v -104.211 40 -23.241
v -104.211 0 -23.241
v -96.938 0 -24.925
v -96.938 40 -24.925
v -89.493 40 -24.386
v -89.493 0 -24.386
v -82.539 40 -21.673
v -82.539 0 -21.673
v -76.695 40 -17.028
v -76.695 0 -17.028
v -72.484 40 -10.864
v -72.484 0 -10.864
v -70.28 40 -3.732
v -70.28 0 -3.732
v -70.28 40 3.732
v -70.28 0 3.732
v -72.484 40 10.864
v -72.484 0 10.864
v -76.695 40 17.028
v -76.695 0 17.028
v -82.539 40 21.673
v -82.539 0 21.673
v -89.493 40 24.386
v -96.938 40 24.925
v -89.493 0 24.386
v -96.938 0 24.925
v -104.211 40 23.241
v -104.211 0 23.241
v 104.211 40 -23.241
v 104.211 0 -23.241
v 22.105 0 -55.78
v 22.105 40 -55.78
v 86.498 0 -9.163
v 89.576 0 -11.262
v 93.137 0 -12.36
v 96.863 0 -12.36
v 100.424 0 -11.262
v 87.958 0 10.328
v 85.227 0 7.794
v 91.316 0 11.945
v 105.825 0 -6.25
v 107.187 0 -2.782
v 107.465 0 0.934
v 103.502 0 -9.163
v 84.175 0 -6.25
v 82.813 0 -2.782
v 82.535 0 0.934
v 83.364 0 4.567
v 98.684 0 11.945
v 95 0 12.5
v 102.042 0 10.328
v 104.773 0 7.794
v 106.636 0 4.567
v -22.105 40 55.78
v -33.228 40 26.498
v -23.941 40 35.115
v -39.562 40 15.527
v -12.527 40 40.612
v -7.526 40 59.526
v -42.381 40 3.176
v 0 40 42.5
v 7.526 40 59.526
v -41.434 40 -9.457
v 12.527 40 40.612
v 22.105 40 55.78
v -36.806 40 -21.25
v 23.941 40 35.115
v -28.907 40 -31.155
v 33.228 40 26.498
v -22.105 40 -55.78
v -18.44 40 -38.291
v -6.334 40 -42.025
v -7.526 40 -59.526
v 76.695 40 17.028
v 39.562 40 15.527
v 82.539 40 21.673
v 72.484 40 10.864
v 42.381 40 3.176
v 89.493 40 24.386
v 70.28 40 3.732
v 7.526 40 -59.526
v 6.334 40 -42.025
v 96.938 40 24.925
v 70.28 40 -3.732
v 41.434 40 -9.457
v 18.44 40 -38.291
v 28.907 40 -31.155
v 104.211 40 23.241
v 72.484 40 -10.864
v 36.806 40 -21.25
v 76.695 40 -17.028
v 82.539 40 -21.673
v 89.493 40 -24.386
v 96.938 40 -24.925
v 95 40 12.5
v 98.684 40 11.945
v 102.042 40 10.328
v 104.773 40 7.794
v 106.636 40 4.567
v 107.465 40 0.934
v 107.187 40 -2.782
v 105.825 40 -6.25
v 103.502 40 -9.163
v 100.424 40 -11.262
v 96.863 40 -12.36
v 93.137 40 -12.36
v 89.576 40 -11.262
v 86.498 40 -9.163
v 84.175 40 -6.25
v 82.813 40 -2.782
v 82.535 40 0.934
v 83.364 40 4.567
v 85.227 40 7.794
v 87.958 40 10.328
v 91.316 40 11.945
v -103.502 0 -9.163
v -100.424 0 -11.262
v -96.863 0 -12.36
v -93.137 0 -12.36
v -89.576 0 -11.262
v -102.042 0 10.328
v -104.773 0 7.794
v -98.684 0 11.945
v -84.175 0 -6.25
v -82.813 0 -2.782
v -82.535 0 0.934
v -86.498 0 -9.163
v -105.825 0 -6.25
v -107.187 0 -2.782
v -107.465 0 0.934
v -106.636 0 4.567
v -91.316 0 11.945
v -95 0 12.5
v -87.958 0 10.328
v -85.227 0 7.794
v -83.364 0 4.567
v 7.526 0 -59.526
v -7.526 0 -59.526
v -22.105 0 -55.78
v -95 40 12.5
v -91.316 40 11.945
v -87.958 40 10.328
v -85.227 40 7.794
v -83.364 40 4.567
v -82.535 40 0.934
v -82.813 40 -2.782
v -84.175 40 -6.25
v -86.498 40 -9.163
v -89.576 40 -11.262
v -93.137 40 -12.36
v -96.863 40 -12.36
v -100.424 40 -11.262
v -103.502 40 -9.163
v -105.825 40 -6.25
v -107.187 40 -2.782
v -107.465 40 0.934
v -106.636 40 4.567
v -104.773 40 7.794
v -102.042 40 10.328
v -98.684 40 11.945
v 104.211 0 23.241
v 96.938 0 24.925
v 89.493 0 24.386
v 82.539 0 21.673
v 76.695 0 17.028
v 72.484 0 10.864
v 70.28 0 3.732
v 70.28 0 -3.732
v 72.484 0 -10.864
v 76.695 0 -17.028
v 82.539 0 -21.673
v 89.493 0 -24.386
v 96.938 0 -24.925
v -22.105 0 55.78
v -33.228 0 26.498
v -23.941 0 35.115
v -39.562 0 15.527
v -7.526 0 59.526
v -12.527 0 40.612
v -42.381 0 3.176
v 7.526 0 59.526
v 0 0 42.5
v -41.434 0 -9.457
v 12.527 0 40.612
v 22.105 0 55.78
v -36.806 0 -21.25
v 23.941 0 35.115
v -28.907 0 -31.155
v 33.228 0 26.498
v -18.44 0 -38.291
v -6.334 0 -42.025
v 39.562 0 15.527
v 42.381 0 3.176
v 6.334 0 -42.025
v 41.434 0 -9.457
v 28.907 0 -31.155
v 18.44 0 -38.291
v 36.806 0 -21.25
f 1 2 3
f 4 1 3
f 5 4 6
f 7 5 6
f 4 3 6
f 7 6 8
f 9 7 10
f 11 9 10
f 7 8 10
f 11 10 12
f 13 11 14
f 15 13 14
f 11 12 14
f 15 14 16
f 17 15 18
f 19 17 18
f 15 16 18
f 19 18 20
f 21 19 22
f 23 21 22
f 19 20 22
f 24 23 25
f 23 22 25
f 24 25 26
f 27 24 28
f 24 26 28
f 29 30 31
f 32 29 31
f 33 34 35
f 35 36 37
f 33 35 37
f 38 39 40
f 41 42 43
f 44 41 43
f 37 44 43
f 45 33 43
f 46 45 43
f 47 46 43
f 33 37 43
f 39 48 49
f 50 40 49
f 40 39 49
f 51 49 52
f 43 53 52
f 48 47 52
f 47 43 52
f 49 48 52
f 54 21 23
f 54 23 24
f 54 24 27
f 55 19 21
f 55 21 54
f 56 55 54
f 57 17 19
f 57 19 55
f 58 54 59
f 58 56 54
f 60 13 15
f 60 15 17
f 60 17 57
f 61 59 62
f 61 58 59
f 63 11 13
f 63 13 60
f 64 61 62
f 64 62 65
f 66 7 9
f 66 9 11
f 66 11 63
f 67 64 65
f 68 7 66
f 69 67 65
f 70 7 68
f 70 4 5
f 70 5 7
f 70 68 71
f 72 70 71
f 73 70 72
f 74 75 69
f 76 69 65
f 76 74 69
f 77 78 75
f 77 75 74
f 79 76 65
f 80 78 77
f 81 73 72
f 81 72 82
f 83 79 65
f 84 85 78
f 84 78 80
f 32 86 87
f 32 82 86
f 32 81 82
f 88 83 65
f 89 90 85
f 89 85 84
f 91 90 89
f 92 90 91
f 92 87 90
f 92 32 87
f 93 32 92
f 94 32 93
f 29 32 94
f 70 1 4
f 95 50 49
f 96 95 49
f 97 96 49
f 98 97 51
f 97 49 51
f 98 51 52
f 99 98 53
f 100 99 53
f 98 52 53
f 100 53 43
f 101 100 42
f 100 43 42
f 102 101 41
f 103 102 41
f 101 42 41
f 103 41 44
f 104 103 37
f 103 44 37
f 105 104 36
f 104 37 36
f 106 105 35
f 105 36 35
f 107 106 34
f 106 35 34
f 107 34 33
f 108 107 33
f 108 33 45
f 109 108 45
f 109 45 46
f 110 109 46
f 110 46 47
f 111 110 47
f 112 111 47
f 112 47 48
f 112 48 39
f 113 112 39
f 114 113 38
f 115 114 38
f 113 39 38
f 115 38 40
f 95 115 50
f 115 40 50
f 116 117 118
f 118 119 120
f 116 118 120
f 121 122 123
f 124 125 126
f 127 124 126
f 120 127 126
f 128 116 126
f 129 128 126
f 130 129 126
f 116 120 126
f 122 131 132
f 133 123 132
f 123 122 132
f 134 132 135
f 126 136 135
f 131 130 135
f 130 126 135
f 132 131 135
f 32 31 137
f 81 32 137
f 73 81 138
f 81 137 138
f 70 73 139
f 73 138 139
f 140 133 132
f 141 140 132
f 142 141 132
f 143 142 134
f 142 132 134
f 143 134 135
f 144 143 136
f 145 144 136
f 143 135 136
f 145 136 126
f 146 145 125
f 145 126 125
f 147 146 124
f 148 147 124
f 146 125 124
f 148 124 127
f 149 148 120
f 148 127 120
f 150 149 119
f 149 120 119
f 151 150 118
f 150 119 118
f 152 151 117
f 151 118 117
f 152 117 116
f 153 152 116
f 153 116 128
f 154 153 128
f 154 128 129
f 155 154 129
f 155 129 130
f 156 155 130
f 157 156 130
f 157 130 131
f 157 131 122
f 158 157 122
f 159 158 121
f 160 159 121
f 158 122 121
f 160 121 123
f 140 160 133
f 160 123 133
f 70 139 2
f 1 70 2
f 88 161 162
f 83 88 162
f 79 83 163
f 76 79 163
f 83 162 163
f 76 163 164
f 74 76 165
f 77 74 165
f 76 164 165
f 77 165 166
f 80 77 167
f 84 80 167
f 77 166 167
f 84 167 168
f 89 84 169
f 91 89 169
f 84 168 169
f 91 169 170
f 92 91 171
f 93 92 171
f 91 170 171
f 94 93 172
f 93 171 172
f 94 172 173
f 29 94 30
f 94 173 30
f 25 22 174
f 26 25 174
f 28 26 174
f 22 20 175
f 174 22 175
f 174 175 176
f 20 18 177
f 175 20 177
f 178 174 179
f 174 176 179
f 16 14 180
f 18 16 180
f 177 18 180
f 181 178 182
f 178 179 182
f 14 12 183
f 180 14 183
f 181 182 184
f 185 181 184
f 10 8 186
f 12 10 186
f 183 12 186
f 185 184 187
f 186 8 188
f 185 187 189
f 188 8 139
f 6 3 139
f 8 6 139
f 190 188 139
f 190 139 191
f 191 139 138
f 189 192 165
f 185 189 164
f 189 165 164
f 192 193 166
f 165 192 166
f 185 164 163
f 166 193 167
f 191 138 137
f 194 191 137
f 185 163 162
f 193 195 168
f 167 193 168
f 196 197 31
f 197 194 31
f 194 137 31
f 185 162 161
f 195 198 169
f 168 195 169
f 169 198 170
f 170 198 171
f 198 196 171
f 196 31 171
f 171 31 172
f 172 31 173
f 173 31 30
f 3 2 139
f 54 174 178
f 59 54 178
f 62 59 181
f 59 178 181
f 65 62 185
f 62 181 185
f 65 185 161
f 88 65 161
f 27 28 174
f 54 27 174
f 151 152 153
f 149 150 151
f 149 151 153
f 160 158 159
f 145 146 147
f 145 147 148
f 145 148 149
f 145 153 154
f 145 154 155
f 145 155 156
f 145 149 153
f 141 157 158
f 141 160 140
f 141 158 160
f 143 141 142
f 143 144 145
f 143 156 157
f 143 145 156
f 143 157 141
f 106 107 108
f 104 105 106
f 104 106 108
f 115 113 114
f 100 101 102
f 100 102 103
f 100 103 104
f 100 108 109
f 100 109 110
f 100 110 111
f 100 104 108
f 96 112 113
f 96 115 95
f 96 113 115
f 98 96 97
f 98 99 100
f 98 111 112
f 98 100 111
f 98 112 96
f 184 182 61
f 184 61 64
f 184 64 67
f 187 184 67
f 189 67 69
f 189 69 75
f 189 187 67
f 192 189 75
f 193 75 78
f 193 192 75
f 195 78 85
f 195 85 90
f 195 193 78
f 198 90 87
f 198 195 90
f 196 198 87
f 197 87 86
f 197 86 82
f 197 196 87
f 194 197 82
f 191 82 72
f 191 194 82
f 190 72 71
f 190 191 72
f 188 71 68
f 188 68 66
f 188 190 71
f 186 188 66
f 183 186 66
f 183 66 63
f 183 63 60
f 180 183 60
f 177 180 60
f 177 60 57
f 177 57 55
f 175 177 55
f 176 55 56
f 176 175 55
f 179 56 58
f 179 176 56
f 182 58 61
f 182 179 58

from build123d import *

# Parameters (mm, degrees)
SKETCH2_R             = 42.5
BOSS_EXTRUDE1_DEPTH   = 40
SKETCH2_R_2           = 12.5
BOSS_EXTRUDE1_2_DEPTH = 40
BOSS_EXTRUDE1_3_DEPTH = 40


with BuildPart() as part:
    # Sketch2 → Boss-Extrude1 (new body)
    with BuildSketch(Plane(origin=(0, 0, 0), x_dir=(1, 0, 0), z_dir=(0, 1, 0))):
        with BuildLine():
            Line((-104.210526316, -23.241475964), (-22.105263158, -55.779542314))
            ThreePointArc((-22.105263158, -55.779542314), (0, -60), (22.105263158, -55.779542314))
            Line((22.105263158, -55.779542314), (104.210526316, -23.241475964))
            ThreePointArc((104.210526316, -23.241475964), (70, 0), (104.210526316, 23.241475964))
            Line((104.210526316, 23.241475964), (22.105263158, 55.779542314))
            ThreePointArc((22.105263158, 55.779542314), (0, 60), (-22.105263158, 55.779542314))
            Line((-22.105263158, 55.779542314), (-104.210526316, 23.241475964))
            ThreePointArc((-104.210526316, 23.241475964), (-70, 0), (-104.210526316, -23.241475964))
        make_face()
        with Locations(Location((0, 0, 0), (0, 0, 270))):
            Circle(SKETCH2_R, mode=Mode.SUBTRACT)
    extrude(amount=BOSS_EXTRUDE1_DEPTH)


with BuildPart() as body_2:
    # Sketch2 → Boss-Extrude1 2 (new body)
    with BuildSketch(Plane(origin=(0, 0, 0), x_dir=(1, 0, 0), z_dir=(0, 1, 0))):
        with Locations(Location((-95, 0, 0), (0, 0, 270))):
            Circle(SKETCH2_R_2)
    extrude(amount=BOSS_EXTRUDE1_2_DEPTH)


with BuildPart() as body_3:
    # Sketch2 → Boss-Extrude1 3 (new body)
    with BuildSketch(Plane(origin=(0, 0, 0), x_dir=(1, 0, 0), z_dir=(0, 1, 0))):
        with Locations(Location((95, 0, 0), (0, 0, 270))):
            Circle(SKETCH2_R_2)
    extrude(amount=BOSS_EXTRUDE1_3_DEPTH)


solid = Compound([part.part, body_2.part, body_3.part])
